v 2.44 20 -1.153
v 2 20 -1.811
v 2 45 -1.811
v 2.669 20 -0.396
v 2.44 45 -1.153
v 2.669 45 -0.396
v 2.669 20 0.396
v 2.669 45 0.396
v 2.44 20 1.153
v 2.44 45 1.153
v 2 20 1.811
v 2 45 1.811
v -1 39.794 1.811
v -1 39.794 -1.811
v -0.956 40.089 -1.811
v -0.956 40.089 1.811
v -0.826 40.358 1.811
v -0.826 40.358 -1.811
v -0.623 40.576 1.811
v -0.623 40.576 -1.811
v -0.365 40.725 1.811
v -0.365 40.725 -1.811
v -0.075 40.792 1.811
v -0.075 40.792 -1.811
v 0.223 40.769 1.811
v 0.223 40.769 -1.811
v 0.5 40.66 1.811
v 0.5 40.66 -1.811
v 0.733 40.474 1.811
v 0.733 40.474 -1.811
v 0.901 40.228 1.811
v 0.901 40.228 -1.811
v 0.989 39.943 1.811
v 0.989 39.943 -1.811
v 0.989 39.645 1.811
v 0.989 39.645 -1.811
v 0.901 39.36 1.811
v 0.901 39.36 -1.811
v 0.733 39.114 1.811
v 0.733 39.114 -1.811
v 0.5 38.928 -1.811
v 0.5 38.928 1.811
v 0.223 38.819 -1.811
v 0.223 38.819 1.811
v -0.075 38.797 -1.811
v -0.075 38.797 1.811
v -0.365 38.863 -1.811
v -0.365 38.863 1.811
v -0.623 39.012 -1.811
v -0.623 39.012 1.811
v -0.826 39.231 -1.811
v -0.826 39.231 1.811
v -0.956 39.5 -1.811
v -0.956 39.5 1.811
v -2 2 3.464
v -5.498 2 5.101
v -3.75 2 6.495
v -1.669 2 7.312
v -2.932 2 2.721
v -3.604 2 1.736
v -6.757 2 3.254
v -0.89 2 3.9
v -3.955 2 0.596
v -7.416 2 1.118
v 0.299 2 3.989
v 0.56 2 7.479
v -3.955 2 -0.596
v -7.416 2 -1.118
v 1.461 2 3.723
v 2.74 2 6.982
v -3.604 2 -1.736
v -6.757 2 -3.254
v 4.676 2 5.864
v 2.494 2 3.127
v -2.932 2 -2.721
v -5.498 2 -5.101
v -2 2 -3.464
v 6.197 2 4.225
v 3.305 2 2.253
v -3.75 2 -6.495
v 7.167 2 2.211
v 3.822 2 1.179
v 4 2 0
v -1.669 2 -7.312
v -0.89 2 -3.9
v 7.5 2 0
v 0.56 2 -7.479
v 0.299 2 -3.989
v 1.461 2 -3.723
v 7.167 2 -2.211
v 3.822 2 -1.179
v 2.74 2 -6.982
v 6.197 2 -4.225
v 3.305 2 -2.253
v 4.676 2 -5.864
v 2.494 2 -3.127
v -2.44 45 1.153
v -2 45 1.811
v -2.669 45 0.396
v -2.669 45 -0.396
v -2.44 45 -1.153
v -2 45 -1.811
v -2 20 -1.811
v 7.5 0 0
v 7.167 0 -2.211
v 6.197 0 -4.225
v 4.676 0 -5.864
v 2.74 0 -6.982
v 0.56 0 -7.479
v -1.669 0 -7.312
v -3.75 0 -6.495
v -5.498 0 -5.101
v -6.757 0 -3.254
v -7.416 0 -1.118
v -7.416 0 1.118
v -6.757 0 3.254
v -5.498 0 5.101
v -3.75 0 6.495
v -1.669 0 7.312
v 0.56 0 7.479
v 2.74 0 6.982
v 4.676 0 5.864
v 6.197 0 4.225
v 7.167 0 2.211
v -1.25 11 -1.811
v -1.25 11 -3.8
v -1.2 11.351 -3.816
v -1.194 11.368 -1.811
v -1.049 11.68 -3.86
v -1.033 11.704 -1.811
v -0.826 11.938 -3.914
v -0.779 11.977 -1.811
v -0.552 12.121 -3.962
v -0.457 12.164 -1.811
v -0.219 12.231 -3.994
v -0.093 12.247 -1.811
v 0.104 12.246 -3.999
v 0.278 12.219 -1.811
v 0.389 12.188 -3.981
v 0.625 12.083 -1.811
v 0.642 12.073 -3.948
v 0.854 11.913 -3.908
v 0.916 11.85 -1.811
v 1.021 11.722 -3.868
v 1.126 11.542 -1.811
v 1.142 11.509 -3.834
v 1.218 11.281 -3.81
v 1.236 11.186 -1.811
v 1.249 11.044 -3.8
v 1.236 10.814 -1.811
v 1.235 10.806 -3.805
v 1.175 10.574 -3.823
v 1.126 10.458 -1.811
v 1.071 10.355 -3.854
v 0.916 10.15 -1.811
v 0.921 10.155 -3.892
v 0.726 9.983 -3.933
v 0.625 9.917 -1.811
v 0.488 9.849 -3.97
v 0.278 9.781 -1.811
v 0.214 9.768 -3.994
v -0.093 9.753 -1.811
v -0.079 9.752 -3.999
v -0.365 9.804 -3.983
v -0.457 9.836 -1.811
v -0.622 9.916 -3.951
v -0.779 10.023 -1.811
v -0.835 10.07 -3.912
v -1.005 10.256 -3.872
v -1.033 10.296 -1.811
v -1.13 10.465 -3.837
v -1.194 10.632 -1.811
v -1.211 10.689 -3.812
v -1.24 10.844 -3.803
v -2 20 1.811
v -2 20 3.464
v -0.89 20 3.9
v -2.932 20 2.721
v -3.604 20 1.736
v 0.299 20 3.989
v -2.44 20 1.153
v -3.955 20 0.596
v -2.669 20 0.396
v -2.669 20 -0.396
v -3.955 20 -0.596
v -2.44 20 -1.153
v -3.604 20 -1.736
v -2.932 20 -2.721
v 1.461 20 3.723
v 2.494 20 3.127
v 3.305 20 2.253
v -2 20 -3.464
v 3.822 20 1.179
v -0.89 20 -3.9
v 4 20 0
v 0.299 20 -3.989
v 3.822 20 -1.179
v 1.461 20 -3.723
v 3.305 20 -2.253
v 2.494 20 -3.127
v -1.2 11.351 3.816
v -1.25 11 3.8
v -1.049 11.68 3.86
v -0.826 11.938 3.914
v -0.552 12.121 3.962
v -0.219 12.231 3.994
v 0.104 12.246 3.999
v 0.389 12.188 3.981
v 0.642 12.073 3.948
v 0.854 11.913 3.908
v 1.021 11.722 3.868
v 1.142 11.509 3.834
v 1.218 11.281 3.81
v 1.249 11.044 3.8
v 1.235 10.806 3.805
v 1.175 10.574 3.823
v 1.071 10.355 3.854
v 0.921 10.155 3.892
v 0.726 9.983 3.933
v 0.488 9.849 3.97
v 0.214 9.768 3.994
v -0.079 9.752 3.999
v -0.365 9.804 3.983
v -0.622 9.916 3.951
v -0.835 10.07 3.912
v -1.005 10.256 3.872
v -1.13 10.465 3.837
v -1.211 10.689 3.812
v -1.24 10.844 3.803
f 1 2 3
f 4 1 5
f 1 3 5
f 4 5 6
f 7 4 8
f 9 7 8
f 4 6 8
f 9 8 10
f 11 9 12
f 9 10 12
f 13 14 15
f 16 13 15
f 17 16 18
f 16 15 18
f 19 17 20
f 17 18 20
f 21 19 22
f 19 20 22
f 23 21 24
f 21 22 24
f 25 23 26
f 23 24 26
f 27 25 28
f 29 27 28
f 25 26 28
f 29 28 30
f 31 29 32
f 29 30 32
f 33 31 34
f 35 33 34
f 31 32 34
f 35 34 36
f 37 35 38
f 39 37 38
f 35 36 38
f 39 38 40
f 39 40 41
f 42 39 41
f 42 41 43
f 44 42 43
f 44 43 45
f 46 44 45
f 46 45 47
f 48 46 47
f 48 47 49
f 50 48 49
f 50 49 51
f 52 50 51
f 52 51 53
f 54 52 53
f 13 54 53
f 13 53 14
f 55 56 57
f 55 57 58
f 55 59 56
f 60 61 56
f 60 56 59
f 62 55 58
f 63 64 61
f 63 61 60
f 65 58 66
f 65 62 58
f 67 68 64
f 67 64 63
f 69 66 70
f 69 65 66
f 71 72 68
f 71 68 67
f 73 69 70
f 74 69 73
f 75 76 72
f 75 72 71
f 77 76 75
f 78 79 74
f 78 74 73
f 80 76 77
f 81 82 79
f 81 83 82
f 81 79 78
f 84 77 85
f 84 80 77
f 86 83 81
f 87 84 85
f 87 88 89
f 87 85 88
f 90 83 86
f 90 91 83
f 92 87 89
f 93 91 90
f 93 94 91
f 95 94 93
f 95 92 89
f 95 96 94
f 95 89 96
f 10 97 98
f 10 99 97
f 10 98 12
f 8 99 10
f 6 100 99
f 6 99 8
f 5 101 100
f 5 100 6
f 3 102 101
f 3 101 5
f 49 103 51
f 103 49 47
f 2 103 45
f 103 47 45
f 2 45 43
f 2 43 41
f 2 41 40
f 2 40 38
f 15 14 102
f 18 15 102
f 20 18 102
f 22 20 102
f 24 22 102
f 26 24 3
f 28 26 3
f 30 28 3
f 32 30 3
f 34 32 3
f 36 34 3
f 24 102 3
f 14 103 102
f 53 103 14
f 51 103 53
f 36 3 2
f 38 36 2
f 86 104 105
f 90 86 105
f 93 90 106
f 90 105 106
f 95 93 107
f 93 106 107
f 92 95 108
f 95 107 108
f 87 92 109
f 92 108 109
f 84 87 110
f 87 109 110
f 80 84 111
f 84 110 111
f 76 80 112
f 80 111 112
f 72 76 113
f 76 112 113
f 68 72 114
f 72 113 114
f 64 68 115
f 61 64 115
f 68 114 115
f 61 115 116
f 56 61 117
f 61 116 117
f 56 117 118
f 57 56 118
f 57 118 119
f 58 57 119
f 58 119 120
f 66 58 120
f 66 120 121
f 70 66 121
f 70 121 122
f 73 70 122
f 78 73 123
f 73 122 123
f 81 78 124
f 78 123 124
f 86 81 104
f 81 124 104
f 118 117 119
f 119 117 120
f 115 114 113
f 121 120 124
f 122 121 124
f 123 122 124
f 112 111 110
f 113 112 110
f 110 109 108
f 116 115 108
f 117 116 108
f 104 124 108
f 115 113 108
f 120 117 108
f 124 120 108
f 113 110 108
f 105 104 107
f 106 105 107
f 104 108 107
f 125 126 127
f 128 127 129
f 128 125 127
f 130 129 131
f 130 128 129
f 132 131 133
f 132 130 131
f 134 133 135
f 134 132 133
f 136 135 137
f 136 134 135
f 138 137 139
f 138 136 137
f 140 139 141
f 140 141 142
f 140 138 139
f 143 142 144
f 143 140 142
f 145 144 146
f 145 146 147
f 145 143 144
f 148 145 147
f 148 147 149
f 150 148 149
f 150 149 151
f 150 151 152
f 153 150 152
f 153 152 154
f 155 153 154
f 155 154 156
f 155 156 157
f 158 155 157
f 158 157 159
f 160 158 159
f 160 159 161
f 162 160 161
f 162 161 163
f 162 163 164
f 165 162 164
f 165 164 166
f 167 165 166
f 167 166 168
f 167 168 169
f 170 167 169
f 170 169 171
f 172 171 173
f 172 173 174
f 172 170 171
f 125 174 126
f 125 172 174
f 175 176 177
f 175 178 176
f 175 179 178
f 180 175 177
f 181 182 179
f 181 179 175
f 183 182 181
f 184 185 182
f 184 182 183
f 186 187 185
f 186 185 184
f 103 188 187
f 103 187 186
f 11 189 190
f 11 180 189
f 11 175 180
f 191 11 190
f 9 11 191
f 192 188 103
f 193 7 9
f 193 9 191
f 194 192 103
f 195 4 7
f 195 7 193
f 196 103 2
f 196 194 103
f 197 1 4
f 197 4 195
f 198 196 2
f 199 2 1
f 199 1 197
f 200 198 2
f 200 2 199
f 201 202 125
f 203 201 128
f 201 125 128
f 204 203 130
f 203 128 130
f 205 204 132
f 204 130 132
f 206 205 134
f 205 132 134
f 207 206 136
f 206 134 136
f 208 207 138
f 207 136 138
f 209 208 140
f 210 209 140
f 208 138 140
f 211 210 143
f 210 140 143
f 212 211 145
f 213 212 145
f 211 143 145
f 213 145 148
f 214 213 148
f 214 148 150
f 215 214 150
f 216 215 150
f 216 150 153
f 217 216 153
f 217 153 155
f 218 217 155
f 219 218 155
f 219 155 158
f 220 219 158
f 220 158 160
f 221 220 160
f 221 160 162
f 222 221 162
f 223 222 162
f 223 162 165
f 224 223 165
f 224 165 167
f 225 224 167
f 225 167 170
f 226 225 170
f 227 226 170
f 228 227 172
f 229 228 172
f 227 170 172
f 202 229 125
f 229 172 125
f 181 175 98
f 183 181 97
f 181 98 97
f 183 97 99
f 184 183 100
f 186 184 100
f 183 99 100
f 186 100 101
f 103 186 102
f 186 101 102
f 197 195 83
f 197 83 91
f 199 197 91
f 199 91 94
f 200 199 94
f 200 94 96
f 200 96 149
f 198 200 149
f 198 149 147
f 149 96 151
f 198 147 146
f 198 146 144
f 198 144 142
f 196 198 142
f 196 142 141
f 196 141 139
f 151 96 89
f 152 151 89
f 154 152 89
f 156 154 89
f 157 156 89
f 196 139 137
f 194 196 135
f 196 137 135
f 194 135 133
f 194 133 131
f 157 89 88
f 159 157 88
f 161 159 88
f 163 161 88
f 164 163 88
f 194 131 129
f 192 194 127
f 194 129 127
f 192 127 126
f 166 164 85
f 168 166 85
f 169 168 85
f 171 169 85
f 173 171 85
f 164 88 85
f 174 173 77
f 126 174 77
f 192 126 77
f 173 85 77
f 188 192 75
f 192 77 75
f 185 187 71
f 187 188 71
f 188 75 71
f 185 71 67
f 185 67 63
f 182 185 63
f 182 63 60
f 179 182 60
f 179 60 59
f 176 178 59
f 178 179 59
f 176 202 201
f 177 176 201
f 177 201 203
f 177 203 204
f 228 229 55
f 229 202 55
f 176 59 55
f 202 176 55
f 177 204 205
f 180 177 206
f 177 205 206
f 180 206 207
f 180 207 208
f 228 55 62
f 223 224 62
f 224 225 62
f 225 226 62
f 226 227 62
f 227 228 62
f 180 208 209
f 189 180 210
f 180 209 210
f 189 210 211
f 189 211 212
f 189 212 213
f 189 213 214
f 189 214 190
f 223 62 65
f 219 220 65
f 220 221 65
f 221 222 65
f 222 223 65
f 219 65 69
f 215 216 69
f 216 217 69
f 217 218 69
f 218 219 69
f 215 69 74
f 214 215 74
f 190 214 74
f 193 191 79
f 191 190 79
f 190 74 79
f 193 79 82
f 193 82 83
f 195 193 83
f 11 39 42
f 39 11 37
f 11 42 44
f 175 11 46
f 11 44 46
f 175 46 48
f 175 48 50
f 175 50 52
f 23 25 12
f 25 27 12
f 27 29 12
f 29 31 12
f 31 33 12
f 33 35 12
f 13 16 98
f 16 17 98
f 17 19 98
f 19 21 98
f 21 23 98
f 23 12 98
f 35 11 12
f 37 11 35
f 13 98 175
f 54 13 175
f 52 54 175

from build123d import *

# Parameters (mm, degrees)
SKETCH1_R               = 7.5
SKETCH1_R_2             = 4
BOSS_EXTRUDE1_DEPTH     = 2
SKETCH1_2_R             = 4
BOSS_EXTRUDE2_DEPTH     = 45
SKETCH2_R               = 4.5
CUT_EXTRUDE1_DEPTH      = 25
CUT_EXTRUDE2_DEPTH      = 25
CUT_EXTRUDE2_DEPTH_BACK = 25
SKETCH3_R               = 1
SKETCH3_R_2             = 1.25


with BuildPart() as part:
    # Sketch1 → Boss-Extrude1 (new body)
    with BuildSketch(Plane(origin=(0, 0, 0), x_dir=(1, 0, 0), z_dir=(0, 1, 0))):
        Circle(SKETCH1_R)
        Circle(SKETCH1_R_2, mode=Mode.SUBTRACT)
    extrude(amount=BOSS_EXTRUDE1_DEPTH)

    # Sketch1<2> → Boss-Extrude2 (add)
    with BuildSketch(Plane(origin=(0, 0, 0), x_dir=(1, 0, 0), z_dir=(0, 1, 0))):
        Circle(SKETCH1_2_R)
    extrude(amount=BOSS_EXTRUDE2_DEPTH)

    # Sketch2 → Cut-Extrude1 (cut)
    with BuildSketch(Plane(origin=(0, 45, 0), x_dir=(1, 0, 0), z_dir=(0, 1, 0))):
        Circle(SKETCH2_R)
        with BuildLine():
            Line((-2, 1.811376185), (2, 1.811376185))
            ThreePointArc((2, 1.811376185), (2.698348325, 0), (2, -1.811376185))
            Line((2, -1.811376185), (-2, -1.811376185))
            ThreePointArc((-2, -1.811376185), (-2.698348325, 0), (-2, 1.811376185))
        make_face(mode=Mode.SUBTRACT)
    extrude(amount=-CUT_EXTRUDE1_DEPTH, mode=Mode.SUBTRACT)

    # Sketch3 → Cut-Extrude2 (cut, two sides: drawn at the far end of the back side and taken through both)
    with BuildSketch(Plane(origin=(0, 0, -1.811376185), x_dir=(-1, 0, 0), z_dir=(0, 0, -1)).offset(-CUT_EXTRUDE2_DEPTH_BACK)):
        with Locations((0, 39.794309812)):
            Circle(SKETCH3_R)
        with Locations((0, 11)):
            Circle(SKETCH3_R_2)
    extrude(amount=CUT_EXTRUDE2_DEPTH + CUT_EXTRUDE2_DEPTH_BACK, mode=Mode.SUBTRACT)


solid = part.part
